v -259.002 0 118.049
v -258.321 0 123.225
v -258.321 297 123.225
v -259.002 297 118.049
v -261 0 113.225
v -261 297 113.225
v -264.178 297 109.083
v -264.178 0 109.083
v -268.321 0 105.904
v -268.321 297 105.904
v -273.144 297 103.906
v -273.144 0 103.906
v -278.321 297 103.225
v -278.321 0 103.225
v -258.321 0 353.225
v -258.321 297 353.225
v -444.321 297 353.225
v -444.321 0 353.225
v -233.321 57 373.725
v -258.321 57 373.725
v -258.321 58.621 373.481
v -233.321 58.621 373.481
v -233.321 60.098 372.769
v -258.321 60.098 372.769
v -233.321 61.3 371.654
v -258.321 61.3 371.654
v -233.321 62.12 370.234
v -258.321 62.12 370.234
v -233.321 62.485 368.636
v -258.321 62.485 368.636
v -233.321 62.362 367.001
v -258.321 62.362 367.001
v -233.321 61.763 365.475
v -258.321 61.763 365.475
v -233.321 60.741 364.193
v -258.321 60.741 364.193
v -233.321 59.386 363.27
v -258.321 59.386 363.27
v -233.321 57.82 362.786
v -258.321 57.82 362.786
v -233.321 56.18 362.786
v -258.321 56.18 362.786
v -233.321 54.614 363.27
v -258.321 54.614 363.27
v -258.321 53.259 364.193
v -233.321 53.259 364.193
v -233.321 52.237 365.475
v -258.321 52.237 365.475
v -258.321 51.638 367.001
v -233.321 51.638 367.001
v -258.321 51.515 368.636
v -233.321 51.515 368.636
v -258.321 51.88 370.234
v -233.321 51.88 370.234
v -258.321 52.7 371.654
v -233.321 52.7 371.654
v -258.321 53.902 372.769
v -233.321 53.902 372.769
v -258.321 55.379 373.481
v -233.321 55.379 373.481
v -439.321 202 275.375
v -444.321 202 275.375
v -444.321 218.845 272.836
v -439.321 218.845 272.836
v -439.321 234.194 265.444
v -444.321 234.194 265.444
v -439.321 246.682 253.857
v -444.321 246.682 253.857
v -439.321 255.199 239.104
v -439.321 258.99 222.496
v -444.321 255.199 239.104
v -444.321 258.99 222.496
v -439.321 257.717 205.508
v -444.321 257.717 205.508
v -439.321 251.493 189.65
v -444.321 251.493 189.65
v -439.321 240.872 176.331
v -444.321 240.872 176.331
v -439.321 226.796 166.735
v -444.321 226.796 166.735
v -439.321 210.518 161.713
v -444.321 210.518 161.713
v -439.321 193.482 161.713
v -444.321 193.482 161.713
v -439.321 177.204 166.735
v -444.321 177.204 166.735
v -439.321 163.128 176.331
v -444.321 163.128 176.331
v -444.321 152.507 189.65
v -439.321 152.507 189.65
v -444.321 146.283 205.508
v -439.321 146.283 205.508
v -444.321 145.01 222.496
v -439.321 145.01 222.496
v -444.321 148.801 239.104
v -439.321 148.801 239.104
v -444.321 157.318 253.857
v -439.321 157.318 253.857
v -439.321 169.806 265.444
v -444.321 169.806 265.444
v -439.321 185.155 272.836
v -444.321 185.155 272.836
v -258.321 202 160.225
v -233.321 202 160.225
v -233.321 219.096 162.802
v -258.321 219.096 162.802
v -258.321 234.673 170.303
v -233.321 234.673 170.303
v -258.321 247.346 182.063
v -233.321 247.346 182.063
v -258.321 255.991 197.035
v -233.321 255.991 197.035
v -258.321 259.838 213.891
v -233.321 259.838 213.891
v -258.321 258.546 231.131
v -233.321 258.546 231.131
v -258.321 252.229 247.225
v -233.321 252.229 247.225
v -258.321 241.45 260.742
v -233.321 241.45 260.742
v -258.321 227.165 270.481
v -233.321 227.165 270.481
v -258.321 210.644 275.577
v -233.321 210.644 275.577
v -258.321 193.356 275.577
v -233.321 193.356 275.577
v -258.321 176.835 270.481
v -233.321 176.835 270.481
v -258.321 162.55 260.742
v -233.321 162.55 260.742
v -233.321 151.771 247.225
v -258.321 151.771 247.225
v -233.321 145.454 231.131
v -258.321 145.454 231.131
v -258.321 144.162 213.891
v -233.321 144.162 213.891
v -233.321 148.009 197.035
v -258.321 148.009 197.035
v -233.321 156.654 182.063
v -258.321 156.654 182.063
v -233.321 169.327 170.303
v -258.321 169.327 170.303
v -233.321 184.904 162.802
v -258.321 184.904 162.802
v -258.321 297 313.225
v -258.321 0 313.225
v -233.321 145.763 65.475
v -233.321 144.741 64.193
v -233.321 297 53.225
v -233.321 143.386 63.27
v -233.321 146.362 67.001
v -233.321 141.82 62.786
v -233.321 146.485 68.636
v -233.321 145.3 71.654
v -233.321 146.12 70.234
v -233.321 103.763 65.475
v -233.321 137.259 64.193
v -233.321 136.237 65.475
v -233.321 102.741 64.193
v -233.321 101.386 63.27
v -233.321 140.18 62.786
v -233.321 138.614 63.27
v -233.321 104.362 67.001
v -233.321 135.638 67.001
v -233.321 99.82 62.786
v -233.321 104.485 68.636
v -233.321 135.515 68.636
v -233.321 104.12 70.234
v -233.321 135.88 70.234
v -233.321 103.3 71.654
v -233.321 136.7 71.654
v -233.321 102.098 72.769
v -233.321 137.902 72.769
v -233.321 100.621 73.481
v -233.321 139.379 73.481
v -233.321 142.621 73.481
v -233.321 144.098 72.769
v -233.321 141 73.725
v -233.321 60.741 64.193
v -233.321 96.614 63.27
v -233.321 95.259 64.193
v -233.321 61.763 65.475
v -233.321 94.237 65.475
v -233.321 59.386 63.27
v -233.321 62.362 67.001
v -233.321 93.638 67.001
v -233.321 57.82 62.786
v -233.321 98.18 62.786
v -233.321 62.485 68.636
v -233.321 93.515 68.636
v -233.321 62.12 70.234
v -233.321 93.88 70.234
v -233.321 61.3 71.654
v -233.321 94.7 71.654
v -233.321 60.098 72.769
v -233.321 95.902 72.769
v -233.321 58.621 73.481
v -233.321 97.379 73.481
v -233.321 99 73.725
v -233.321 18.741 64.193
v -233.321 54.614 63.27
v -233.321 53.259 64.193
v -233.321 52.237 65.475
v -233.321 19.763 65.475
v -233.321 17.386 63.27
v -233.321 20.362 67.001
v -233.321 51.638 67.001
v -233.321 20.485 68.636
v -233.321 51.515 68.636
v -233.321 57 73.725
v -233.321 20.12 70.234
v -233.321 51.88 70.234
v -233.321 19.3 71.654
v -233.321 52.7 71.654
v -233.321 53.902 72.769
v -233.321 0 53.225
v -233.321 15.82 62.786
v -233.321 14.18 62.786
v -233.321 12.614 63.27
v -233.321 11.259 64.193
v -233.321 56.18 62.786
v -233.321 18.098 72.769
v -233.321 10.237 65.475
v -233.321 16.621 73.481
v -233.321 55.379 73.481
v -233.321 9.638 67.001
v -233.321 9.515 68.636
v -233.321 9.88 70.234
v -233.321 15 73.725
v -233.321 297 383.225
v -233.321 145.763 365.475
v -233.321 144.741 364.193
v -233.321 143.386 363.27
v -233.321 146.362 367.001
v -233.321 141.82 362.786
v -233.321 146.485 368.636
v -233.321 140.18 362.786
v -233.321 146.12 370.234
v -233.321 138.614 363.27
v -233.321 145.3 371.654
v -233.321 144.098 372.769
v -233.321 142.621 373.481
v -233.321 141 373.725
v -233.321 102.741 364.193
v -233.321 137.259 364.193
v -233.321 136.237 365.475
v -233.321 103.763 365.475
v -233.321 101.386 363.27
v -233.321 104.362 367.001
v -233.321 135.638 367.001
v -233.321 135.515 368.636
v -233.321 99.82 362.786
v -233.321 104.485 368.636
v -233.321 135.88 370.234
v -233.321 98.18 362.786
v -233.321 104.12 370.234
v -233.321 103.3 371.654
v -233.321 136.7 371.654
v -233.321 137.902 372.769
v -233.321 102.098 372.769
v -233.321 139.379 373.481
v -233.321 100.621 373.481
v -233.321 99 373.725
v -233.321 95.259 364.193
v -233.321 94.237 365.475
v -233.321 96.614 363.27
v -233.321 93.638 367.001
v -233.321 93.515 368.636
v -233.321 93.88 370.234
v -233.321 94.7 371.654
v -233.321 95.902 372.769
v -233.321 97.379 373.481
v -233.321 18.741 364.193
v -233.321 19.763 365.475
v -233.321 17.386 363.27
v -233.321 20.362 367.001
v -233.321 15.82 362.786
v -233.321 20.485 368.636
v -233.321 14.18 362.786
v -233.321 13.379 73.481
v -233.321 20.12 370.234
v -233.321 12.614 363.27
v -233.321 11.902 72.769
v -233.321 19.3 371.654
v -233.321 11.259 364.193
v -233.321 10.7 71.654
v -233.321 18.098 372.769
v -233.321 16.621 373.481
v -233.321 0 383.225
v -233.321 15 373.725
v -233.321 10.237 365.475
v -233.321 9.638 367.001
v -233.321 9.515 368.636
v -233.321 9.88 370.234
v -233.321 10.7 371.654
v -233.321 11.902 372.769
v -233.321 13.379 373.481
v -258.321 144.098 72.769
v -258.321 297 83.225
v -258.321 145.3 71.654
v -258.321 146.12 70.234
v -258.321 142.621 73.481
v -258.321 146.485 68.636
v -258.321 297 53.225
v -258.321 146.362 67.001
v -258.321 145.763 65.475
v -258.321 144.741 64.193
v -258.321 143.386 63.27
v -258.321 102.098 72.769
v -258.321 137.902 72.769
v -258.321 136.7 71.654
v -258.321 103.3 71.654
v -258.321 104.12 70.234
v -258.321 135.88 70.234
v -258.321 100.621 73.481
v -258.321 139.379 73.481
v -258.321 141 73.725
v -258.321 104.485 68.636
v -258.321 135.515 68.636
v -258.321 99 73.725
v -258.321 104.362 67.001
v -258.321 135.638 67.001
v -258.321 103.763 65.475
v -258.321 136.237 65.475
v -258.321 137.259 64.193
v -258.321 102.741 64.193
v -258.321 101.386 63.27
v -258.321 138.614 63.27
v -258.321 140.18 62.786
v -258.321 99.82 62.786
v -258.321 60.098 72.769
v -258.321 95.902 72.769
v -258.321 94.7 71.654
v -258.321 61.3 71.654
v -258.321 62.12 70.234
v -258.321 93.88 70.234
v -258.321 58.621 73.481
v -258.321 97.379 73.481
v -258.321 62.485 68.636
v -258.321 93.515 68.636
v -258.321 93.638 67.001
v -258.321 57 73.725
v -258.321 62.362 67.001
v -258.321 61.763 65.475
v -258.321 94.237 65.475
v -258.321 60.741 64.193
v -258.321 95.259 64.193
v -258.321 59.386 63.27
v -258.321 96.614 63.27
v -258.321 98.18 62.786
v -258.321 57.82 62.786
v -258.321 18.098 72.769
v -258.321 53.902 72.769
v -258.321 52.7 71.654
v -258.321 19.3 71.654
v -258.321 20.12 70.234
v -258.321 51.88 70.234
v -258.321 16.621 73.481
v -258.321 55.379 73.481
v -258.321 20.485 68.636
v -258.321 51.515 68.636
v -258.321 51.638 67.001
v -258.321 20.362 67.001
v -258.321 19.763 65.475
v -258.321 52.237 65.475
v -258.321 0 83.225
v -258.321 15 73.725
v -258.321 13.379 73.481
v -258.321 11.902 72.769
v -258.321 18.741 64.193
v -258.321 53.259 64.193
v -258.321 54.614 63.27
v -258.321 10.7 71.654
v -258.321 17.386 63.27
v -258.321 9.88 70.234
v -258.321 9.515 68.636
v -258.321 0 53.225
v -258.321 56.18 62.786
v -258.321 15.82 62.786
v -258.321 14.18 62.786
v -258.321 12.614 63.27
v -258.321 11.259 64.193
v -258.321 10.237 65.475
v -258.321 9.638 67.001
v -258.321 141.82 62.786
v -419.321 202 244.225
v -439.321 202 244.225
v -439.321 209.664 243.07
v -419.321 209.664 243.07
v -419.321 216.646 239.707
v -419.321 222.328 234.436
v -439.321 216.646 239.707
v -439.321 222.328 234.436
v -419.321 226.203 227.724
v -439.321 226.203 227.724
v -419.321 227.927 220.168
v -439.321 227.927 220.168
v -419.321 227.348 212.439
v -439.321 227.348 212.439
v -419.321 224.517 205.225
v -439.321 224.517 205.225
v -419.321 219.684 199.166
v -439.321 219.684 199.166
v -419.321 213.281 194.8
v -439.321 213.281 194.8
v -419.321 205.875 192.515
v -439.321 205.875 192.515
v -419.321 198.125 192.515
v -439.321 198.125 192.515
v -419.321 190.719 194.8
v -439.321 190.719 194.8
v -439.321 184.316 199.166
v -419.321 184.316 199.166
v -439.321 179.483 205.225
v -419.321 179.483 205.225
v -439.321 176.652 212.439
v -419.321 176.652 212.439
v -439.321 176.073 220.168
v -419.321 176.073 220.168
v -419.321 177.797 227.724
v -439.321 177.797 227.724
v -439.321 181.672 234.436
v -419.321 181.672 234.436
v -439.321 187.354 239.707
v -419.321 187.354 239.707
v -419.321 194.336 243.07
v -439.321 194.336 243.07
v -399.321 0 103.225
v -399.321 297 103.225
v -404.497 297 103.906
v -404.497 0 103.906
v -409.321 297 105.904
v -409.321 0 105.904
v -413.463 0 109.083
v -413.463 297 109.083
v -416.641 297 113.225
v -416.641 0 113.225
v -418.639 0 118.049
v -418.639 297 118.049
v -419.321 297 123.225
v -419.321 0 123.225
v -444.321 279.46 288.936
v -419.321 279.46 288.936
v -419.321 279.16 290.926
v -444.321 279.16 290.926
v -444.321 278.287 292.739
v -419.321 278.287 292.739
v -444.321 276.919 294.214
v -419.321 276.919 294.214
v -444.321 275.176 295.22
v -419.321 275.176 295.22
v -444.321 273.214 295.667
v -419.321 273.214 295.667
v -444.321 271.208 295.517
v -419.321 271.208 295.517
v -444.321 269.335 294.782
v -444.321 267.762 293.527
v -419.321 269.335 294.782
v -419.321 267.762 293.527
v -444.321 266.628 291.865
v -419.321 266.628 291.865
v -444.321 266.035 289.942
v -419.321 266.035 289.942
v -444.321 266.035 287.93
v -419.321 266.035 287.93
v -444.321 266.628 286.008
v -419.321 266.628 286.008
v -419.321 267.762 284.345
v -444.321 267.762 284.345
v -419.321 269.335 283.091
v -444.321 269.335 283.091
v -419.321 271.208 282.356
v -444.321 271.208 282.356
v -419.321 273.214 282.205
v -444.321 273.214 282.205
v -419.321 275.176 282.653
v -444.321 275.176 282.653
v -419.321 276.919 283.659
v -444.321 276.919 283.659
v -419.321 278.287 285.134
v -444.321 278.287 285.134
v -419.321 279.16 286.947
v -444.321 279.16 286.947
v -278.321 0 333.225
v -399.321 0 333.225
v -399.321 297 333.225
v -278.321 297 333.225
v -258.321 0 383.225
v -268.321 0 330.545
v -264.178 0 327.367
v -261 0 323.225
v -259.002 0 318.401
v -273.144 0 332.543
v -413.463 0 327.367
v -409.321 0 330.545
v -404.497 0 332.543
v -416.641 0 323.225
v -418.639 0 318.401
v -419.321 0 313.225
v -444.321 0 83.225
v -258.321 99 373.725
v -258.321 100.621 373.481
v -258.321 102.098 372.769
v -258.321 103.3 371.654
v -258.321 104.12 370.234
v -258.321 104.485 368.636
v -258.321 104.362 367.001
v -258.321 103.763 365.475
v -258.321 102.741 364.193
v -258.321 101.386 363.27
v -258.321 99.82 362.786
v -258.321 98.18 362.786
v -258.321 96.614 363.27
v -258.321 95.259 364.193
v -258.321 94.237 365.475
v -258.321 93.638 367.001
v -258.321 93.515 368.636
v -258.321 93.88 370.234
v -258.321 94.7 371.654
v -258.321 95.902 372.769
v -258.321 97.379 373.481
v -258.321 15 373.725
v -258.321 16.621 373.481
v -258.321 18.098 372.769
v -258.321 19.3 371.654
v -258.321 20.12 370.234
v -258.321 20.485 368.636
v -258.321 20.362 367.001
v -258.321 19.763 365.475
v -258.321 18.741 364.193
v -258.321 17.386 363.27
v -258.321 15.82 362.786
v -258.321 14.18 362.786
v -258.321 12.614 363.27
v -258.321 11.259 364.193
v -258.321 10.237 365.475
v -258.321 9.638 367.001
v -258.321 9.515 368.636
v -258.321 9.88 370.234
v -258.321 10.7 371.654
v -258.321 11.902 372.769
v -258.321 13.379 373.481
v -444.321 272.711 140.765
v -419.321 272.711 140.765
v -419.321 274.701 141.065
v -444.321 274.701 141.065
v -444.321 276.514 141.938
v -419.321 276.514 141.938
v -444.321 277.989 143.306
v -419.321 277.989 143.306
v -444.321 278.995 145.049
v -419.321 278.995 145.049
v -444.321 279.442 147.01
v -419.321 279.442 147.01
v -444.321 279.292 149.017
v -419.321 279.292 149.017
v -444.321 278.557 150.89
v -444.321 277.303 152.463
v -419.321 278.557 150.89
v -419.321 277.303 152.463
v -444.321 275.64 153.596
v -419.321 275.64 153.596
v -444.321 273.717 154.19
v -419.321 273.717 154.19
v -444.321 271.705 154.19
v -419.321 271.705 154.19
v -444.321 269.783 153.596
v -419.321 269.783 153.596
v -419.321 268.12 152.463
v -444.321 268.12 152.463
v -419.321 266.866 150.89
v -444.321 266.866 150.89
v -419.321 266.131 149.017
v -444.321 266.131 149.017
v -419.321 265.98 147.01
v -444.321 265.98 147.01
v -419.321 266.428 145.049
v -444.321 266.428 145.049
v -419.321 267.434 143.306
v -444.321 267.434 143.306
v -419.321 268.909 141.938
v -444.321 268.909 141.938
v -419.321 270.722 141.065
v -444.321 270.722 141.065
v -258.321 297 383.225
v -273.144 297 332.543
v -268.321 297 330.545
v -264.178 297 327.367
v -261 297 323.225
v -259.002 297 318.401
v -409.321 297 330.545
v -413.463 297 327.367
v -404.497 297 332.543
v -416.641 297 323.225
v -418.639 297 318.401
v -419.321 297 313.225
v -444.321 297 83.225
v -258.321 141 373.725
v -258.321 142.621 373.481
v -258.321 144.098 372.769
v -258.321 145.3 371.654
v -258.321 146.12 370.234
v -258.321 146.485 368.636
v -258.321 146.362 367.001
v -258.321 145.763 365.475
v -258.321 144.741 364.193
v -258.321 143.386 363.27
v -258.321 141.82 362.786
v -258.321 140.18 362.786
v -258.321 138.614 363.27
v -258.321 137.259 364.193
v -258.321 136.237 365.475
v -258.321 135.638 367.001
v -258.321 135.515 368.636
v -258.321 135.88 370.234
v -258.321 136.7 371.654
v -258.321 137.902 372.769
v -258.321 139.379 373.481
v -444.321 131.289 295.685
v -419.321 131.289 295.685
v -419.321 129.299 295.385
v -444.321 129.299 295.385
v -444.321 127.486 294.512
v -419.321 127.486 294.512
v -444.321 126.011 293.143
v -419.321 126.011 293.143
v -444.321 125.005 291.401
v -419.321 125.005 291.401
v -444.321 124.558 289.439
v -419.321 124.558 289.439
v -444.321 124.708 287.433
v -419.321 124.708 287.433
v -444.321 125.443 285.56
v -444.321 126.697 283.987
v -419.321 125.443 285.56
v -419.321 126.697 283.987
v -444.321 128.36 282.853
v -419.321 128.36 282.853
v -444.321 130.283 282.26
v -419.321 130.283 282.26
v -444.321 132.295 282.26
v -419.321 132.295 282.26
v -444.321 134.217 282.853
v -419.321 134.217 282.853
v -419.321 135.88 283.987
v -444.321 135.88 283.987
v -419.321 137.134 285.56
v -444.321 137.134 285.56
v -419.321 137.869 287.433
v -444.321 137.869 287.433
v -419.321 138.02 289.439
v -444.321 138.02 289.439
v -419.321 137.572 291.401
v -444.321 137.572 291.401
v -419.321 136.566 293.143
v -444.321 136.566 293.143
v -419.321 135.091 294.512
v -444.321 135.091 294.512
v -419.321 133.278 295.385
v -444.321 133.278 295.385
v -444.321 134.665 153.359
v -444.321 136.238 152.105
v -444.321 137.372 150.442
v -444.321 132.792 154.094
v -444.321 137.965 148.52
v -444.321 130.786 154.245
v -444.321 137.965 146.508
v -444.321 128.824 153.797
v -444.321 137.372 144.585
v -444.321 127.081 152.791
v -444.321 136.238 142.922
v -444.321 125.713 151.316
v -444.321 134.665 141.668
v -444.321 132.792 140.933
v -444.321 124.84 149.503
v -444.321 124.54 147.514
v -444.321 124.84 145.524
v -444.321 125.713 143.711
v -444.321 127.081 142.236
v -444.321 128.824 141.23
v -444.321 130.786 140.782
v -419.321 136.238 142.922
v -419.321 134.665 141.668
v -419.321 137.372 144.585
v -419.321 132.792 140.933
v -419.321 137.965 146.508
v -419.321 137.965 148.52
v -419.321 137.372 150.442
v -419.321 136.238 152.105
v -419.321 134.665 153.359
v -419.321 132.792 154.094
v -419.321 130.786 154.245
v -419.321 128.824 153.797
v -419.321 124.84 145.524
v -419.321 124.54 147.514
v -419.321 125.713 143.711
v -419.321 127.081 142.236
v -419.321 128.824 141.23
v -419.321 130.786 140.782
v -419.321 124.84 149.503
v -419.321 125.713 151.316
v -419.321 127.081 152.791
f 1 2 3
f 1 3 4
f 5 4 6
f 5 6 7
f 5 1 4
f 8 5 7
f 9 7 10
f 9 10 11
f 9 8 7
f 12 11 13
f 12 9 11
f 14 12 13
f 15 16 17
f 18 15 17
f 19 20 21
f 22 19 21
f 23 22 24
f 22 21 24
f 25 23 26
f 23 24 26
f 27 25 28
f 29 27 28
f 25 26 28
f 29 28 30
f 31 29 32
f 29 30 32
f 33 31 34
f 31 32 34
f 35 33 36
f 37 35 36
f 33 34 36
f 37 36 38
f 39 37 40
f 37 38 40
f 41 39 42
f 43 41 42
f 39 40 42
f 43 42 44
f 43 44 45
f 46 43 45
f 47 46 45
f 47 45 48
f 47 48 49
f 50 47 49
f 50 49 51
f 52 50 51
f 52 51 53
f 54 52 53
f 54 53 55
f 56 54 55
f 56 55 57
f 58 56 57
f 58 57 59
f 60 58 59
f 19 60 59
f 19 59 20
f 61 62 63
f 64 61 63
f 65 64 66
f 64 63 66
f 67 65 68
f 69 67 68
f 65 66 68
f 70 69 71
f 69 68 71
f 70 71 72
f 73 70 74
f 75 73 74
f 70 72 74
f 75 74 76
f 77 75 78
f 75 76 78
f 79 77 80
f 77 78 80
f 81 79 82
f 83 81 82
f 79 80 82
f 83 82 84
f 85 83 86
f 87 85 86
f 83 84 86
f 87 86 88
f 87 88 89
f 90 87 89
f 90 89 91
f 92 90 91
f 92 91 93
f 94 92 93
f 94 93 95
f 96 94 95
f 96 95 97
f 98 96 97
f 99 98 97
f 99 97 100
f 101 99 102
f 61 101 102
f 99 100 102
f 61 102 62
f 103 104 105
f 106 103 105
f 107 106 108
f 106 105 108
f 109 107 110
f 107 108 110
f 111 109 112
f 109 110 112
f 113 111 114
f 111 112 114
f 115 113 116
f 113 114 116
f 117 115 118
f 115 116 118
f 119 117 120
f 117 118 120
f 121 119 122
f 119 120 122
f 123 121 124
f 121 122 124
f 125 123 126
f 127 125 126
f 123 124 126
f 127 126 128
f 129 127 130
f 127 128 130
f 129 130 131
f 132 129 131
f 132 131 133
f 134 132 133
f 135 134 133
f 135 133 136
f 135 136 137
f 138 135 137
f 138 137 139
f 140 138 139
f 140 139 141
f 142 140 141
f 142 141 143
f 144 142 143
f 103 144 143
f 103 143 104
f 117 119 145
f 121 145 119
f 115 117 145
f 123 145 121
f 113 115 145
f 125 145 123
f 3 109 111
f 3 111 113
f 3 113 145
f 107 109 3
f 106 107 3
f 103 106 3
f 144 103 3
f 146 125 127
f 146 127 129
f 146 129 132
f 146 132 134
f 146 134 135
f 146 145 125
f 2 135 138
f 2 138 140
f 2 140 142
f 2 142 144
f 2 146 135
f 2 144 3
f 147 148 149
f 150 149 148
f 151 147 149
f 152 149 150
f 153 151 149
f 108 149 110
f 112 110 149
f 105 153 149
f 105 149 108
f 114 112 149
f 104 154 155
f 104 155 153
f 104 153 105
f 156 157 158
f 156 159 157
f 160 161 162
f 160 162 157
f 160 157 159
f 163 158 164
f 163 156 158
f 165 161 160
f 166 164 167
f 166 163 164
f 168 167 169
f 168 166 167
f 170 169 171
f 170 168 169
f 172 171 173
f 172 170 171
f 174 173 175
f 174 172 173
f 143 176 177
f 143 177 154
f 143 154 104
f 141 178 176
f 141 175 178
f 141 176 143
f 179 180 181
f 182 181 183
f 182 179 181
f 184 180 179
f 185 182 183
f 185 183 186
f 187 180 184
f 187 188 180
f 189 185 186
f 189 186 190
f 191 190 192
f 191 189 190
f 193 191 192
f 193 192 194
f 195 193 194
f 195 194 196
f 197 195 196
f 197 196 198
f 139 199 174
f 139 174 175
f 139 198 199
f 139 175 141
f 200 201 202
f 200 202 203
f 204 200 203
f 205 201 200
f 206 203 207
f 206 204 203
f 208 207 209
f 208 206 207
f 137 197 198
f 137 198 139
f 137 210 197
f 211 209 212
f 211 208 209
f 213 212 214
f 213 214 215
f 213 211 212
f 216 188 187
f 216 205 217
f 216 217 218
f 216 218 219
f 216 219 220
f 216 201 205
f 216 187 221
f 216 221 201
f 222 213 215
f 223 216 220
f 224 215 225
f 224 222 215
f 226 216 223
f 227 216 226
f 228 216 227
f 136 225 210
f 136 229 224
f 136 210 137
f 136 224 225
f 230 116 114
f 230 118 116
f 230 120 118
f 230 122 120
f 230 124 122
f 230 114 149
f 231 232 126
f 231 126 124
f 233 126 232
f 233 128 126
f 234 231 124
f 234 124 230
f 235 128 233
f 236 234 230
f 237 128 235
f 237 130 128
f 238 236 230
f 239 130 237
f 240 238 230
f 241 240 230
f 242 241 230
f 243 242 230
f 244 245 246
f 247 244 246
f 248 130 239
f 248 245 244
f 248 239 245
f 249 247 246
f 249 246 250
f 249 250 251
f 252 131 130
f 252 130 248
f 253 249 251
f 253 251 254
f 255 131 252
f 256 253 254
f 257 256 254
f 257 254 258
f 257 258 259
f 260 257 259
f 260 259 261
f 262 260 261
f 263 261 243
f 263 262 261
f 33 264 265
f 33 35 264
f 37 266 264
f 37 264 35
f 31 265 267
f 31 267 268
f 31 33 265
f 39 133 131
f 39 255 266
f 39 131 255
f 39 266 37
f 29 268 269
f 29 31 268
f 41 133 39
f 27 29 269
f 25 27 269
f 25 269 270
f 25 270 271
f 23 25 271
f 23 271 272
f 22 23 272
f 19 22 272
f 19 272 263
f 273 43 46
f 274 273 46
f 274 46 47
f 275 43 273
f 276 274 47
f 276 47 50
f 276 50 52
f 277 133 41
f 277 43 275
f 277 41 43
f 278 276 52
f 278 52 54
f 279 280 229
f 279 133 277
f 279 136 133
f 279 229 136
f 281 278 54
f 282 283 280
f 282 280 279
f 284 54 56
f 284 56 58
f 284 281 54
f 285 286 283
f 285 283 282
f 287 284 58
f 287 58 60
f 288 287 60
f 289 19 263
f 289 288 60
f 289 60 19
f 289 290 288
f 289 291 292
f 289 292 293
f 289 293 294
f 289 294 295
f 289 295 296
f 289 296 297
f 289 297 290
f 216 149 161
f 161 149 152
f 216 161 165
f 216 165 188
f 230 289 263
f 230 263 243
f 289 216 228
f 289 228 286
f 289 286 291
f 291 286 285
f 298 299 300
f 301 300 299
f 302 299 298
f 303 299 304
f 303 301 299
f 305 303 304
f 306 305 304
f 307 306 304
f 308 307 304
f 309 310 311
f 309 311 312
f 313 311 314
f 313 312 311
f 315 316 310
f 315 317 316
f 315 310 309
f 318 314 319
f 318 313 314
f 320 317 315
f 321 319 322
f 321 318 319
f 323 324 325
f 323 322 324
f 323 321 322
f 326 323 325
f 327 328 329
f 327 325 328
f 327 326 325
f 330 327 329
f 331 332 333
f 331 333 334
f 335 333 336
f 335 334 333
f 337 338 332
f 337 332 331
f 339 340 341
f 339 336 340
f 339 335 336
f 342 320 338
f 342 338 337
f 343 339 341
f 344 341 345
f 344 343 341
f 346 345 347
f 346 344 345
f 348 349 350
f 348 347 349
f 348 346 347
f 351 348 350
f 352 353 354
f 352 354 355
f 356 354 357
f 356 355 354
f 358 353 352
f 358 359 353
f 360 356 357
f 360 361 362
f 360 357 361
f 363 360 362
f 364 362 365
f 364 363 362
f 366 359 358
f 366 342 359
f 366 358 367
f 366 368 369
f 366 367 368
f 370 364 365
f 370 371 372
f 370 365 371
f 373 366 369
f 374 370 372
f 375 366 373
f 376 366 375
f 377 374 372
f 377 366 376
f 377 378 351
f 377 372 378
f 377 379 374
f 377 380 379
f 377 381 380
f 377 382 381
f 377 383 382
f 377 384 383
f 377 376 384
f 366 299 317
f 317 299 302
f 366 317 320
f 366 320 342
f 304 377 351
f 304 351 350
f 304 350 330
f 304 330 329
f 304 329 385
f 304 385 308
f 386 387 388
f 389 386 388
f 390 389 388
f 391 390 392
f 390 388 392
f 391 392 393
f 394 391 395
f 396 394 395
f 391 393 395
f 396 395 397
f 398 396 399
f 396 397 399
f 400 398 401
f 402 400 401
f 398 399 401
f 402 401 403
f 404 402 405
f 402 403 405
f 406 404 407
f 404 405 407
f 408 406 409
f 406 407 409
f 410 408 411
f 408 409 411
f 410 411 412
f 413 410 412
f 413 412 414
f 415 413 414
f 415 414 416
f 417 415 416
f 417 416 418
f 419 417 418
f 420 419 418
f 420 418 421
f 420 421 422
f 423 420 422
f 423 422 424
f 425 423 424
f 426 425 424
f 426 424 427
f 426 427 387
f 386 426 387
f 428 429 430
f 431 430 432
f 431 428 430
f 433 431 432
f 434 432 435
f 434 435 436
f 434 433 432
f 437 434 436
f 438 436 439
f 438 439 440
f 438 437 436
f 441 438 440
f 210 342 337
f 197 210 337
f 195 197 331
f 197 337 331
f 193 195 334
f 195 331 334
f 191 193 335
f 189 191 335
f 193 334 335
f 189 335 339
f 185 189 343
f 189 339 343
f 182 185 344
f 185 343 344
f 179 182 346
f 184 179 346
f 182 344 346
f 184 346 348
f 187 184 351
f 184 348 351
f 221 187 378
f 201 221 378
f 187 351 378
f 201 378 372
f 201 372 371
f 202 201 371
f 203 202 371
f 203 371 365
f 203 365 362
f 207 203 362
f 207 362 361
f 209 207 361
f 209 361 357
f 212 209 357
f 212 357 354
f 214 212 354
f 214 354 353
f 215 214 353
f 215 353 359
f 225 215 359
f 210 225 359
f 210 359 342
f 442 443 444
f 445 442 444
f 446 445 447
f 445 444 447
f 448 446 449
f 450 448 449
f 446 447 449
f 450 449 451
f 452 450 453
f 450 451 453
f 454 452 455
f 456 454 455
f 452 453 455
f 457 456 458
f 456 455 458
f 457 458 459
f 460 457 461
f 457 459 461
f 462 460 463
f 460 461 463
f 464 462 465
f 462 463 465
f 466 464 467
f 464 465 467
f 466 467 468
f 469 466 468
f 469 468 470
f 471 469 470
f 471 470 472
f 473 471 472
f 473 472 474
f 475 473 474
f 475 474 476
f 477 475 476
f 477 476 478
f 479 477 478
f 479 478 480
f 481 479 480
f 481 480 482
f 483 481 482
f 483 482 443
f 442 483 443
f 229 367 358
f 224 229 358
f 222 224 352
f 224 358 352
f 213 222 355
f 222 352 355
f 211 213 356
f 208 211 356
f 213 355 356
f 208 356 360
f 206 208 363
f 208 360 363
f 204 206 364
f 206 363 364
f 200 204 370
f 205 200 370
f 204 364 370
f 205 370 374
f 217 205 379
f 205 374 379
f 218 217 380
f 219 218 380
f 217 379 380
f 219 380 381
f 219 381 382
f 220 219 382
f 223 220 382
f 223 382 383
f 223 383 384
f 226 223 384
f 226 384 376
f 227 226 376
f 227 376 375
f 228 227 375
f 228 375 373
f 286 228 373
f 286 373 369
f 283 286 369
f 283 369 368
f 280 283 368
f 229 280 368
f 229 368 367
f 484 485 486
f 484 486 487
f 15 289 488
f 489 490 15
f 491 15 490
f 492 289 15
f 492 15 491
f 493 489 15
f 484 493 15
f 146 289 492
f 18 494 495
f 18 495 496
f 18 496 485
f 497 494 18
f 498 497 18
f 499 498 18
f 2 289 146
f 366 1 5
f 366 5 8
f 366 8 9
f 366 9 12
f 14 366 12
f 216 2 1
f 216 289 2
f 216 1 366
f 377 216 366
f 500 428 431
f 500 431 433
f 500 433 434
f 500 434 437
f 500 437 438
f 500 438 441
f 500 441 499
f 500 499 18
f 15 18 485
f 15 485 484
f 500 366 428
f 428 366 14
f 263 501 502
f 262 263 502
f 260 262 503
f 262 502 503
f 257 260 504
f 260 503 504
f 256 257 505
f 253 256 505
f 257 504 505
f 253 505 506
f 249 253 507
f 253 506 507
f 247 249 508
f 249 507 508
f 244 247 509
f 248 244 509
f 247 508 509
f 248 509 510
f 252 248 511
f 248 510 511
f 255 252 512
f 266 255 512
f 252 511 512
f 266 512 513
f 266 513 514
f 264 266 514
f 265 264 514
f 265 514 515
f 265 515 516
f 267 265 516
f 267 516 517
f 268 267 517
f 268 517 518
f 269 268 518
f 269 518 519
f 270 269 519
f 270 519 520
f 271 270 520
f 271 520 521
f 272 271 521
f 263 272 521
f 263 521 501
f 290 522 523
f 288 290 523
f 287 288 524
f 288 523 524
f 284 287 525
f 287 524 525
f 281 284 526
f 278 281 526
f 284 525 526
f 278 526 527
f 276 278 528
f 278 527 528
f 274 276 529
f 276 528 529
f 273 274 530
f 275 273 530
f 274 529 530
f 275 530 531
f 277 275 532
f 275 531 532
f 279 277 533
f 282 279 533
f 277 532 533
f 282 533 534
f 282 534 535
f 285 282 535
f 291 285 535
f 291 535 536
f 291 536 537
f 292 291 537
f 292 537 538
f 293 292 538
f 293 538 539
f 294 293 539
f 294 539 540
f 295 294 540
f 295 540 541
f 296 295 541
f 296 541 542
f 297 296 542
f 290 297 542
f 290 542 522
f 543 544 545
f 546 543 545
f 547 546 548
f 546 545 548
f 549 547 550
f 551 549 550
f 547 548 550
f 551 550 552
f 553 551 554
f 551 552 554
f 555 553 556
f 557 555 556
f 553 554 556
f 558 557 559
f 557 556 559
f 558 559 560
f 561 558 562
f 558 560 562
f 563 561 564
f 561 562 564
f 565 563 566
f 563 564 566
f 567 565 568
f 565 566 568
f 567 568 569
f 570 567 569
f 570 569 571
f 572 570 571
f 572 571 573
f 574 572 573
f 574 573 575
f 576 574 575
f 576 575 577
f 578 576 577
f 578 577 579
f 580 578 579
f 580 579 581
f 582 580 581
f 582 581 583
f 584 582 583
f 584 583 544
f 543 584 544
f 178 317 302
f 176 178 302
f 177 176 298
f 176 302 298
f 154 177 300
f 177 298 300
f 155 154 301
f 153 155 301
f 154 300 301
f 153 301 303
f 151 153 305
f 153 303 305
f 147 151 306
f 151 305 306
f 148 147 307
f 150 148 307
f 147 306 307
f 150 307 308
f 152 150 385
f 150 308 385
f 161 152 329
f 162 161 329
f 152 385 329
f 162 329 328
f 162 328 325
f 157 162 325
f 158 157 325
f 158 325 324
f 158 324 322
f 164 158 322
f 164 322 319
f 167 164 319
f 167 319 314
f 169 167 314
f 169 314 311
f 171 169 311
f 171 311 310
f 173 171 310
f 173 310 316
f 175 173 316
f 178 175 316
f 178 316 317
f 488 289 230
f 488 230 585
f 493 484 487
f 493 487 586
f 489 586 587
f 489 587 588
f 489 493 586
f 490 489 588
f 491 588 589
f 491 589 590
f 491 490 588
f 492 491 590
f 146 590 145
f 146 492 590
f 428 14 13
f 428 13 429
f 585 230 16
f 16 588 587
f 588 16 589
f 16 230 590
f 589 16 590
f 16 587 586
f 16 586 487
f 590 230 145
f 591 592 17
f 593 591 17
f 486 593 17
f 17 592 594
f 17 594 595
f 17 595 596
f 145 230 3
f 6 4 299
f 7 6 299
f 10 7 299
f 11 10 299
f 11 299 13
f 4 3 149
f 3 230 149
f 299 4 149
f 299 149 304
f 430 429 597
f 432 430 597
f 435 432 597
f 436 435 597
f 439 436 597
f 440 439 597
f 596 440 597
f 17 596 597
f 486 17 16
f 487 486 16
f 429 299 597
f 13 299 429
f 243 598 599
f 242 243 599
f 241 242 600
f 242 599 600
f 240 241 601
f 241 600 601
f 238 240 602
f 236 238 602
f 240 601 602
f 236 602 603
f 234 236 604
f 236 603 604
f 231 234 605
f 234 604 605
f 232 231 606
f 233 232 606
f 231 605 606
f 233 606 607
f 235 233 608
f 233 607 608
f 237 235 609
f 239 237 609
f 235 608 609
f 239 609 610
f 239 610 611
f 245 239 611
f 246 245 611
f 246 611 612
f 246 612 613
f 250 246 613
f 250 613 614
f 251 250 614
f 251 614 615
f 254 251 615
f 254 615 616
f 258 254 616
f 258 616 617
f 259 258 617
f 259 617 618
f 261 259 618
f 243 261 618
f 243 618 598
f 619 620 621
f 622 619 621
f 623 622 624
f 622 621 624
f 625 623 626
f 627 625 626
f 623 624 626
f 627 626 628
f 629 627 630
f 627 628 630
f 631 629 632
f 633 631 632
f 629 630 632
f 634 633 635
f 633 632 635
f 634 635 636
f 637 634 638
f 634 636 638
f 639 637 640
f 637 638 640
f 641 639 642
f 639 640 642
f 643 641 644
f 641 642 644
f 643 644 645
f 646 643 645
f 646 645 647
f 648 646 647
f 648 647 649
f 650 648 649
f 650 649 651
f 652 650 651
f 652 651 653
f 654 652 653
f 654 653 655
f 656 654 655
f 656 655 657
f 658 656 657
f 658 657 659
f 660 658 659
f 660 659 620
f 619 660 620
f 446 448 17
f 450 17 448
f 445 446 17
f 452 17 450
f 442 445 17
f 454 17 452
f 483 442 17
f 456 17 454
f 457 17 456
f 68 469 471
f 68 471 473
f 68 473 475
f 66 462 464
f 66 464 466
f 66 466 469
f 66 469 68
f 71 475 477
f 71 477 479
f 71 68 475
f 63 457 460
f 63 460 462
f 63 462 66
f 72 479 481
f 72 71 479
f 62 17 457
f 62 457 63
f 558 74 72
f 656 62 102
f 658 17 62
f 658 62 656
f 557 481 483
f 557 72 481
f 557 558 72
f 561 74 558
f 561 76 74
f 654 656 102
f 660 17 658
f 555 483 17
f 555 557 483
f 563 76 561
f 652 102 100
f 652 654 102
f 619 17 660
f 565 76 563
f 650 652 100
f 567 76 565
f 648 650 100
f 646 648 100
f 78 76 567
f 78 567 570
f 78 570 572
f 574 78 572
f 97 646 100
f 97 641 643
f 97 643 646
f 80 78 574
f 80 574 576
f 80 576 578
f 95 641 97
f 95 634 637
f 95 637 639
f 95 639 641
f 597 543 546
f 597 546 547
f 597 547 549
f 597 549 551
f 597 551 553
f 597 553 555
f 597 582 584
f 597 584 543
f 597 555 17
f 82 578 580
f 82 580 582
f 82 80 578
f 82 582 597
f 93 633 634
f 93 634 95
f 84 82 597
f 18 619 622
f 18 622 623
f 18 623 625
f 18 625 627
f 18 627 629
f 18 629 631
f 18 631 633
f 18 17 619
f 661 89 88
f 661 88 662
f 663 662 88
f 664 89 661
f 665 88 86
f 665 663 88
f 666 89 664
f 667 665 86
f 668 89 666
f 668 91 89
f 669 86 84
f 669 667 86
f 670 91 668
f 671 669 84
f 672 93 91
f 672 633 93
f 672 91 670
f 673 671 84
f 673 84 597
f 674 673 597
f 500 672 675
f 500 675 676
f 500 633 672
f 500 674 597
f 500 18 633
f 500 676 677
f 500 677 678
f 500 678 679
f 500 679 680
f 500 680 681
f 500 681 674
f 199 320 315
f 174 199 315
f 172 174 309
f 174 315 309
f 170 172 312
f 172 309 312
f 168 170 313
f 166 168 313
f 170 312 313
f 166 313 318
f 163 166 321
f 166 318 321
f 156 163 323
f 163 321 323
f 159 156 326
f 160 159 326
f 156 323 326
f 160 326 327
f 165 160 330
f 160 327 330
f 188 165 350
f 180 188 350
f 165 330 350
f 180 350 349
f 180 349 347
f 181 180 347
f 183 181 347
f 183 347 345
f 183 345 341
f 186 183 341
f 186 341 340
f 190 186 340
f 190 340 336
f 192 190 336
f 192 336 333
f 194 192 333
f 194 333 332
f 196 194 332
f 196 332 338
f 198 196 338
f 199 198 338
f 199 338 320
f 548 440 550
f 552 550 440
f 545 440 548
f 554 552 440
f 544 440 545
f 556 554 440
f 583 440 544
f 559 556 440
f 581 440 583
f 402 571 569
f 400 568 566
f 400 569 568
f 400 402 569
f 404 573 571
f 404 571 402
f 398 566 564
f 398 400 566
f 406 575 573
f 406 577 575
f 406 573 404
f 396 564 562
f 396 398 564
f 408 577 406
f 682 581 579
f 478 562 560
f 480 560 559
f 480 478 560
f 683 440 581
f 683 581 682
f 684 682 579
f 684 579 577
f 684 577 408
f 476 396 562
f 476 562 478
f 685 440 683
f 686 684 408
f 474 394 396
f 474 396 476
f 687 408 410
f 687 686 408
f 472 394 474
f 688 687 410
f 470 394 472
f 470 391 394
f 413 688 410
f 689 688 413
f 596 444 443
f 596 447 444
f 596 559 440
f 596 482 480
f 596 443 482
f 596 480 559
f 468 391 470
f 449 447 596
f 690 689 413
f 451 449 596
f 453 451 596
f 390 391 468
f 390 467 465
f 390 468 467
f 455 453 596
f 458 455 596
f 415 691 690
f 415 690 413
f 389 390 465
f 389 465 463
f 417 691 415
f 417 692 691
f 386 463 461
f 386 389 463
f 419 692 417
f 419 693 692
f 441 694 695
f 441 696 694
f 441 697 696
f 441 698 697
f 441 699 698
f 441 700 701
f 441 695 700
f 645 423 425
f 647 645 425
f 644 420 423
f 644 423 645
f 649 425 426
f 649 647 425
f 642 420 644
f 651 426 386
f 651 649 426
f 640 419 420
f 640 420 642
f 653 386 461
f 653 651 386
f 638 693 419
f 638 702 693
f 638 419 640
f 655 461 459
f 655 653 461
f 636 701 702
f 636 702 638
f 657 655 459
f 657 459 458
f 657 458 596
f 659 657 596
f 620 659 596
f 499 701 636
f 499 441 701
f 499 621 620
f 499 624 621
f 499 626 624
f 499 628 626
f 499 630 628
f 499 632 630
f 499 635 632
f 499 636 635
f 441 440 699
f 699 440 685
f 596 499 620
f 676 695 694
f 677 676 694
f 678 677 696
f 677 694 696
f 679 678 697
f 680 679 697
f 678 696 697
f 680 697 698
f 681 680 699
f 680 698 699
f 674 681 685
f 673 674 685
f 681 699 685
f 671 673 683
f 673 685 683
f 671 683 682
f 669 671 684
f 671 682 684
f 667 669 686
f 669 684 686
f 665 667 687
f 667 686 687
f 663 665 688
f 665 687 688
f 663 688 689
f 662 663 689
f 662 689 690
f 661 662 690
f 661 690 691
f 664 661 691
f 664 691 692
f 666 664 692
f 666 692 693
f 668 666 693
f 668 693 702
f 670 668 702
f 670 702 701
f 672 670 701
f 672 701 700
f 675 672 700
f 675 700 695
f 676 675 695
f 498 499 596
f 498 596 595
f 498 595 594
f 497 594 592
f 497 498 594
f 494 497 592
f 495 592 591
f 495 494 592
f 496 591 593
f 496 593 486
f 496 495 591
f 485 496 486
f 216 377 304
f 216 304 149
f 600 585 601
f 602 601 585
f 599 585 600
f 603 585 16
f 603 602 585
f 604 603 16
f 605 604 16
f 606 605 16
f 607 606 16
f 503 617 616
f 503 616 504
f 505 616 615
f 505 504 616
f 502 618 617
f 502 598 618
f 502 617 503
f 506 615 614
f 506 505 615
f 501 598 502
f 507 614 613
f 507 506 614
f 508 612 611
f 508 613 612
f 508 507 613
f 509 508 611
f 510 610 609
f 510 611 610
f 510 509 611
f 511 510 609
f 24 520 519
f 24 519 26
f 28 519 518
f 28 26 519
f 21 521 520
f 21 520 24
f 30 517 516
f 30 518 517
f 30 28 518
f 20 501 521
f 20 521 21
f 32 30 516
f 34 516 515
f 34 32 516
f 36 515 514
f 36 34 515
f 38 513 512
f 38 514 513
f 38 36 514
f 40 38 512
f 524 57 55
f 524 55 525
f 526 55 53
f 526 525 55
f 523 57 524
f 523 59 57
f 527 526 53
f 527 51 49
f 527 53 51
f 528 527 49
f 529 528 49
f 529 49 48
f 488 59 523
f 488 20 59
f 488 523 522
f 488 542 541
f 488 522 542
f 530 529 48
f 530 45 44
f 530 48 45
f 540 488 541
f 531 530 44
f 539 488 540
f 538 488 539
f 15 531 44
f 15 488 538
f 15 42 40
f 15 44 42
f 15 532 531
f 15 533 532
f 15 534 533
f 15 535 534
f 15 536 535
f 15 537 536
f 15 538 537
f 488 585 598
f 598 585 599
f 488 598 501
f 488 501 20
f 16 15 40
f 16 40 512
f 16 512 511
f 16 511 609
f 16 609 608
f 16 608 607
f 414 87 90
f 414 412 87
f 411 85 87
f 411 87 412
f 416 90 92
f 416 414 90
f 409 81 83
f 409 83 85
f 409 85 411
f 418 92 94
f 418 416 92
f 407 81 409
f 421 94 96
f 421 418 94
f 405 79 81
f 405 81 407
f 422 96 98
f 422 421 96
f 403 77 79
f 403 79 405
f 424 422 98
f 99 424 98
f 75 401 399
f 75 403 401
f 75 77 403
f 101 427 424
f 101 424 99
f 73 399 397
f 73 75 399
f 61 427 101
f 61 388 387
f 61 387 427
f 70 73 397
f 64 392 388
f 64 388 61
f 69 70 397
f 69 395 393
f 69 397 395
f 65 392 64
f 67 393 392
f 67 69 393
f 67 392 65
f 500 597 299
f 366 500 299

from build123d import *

# Parameters (mm, degrees)
EXTRUDE_1_DEPTH          = 297
SKETCH_6_R               = 57.15
CUT_EXTRUDE_1_DEPTH      = 5
CUT_EXTRUDE_2_REACH      = 528.789
SKETCH_7_R               = 26
CUT_EXTRUDE_3_REACH      = 530.764
SKETCH_8_R               = 58
CUT_EXTRUDE_4_REACH      = 521.294
SKETCH_10_R              = 5.5
HOLE_WIZARD_M12_1_D      = 13.5
HOLE_WIZARD_M12_1_DEPTH  = 25
PATTERN_CIRCULAR_1_COUNT = 4


with BuildPart() as part:
    # 草图4 → 凸台-拉伸1 (new body)
    with BuildSketch(Plane(origin=(0, 0, 0), x_dir=(1, 0, 0), z_dir=(0, 1, 0))):
        Polygon((-258.320541352, -83.224920734), (-258.320541352, -53.224920734), (-233.320541352, -53.224920734), (-233.320541352, -383.224920734), (-258.320541352, -383.224920734), (-258.320541352, -353.224920734), (-444.320541352, -353.224920734), (-444.320541352, -83.224920734), align=None)
        with BuildLine():
            Line((-258.320541352, -313.224920734), (-258.320541352, -123.224920734))
            ThreePointArc((-258.320541352, -123.224920734), (-264.178405729, -109.08278511), (-278.320541352, -103.224920734))
            Line((-278.320541352, -103.224920734), (-399.320541352, -103.224920734))
            ThreePointArc((-399.320541352, -103.224920734), (-413.462676976, -109.08278511), (-419.320541352, -123.224920734))
            Line((-419.320541352, -123.224920734), (-419.320541352, -313.224920734))
            ThreePointArc((-419.320541352, -313.224920734), (-413.462676976, -327.367056358), (-399.320541352, -333.224920734))
            Line((-399.320541352, -333.224920734), (-278.320541352, -333.224920734))
            ThreePointArc((-278.320541352, -333.224920734), (-264.178405729, -327.367056358), (-258.320541352, -313.224920734))
        make_face(mode=Mode.SUBTRACT)
    extrude(amount=EXTRUDE_1_DEPTH)

    # 草图6 → 切除-拉伸1 (cut)
    with BuildSketch(Plane.ZY.offset(444.320541352)):
        with Locations((218.224920734, 202)):
            Circle(SKETCH_6_R)
    extrude(amount=-CUT_EXTRUDE_1_DEPTH, mode=Mode.SUBTRACT)

    # 草图7 → 切除-拉伸2 (cut, up to next)
    with BuildSketch(Plane.ZY.offset(439.320541352), mode=Mode.PRIVATE) as cut_extrude_2_sk1:
        with Locations((218.224920734, 202)):
            Circle(SKETCH_7_R)
    cut_extrude_2_tool1 = extrude(cut_extrude_2_sk1.sketch, amount=-CUT_EXTRUDE_2_REACH, mode=Mode.PRIVATE) & part.part
    add(cut_extrude_2_tool1.solids().sort_by_distance((-439.320541, 202, 218.224921))[0], mode=Mode.SUBTRACT)

    # 草图8 → 切除-拉伸3 (cut, up to next)
    with BuildSketch(Plane(origin=(-233.320541352, 0, 0), x_dir=(0, 0, -1), z_dir=(1, 0, 0)), mode=Mode.PRIVATE) as cut_extrude_3_sk1:
        with Locations((-218.224920734, 202)):
            Circle(SKETCH_8_R)
    cut_extrude_3_tool1 = extrude(cut_extrude_3_sk1.sketch, amount=-CUT_EXTRUDE_3_REACH, mode=Mode.PRIVATE) & part.part
    add(cut_extrude_3_tool1.solids().sort_by_distance((-233.320541, 202, 218.224921))[0], mode=Mode.SUBTRACT)

    # 草图10 → 切除-拉伸4 (cut, up to next)
    with BuildSketch(Plane.ZY.offset(258.320541352), mode=Mode.PRIVATE) as cut_extrude_4_sk1:
        with Locations((368.224920734, 15)):
            Circle(SKETCH_10_R)
    cut_extrude_4_tool1 = extrude(cut_extrude_4_sk1.sketch, amount=-CUT_EXTRUDE_4_REACH, mode=Mode.PRIVATE) & part.part
    # 草图10 → 切除-拉伸4 (cut, up to next)
    with BuildSketch(Plane.ZY.offset(258.320541352), mode=Mode.PRIVATE) as cut_extrude_4_sk2:
        with Locations((368.224920734, 57)):
            Circle(SKETCH_10_R)
    cut_extrude_4_tool2 = extrude(cut_extrude_4_sk2.sketch, amount=-CUT_EXTRUDE_4_REACH, mode=Mode.PRIVATE) & part.part
    # 草图10 → 切除-拉伸4 (cut, up to next)
    with BuildSketch(Plane.ZY.offset(258.320541352), mode=Mode.PRIVATE) as cut_extrude_4_sk3:
        with Locations((368.224920734, 99)):
            Circle(SKETCH_10_R)
    cut_extrude_4_tool3 = extrude(cut_extrude_4_sk3.sketch, amount=-CUT_EXTRUDE_4_REACH, mode=Mode.PRIVATE) & part.part
    # 草图10 → 切除-拉伸4 (cut, up to next)
    with BuildSketch(Plane.ZY.offset(258.320541352), mode=Mode.PRIVATE) as cut_extrude_4_sk4:
        with Locations((368.224920734, 141)):
            Circle(SKETCH_10_R)
    cut_extrude_4_tool4 = extrude(cut_extrude_4_sk4.sketch, amount=-CUT_EXTRUDE_4_REACH, mode=Mode.PRIVATE) & part.part
    # 草图10 → 切除-拉伸4 (cut, up to next)
    with BuildSketch(Plane.ZY.offset(258.320541352), mode=Mode.PRIVATE) as cut_extrude_4_sk5:
        with Locations((68.224920734, 141)):
            Circle(SKETCH_10_R)
    cut_extrude_4_tool5 = extrude(cut_extrude_4_sk5.sketch, amount=-CUT_EXTRUDE_4_REACH, mode=Mode.PRIVATE) & part.part
    # 草图10 → 切除-拉伸4 (cut, up to next)
    with BuildSketch(Plane.ZY.offset(258.320541352), mode=Mode.PRIVATE) as cut_extrude_4_sk6:
        with Locations((68.224920734, 15)):
            Circle(SKETCH_10_R)
    cut_extrude_4_tool6 = extrude(cut_extrude_4_sk6.sketch, amount=-CUT_EXTRUDE_4_REACH, mode=Mode.PRIVATE) & part.part
    # 草图10 → 切除-拉伸4 (cut, up to next)
    with BuildSketch(Plane.ZY.offset(258.320541352), mode=Mode.PRIVATE) as cut_extrude_4_sk7:
        with Locations((68.224920734, 57)):
            Circle(SKETCH_10_R)
    cut_extrude_4_tool7 = extrude(cut_extrude_4_sk7.sketch, amount=-CUT_EXTRUDE_4_REACH, mode=Mode.PRIVATE) & part.part
    # 草图10 → 切除-拉伸4 (cut, up to next)
    with BuildSketch(Plane.ZY.offset(258.320541352), mode=Mode.PRIVATE) as cut_extrude_4_sk8:
        with Locations((68.224920734, 99)):
            Circle(SKETCH_10_R)
    cut_extrude_4_tool8 = extrude(cut_extrude_4_sk8.sketch, amount=-CUT_EXTRUDE_4_REACH, mode=Mode.PRIVATE) & part.part
    add(cut_extrude_4_tool1.solids().sort_by_distance((-258.320541, 15, 368.224921))[0], mode=Mode.SUBTRACT)
    add(cut_extrude_4_tool2.solids().sort_by_distance((-258.320541, 57, 368.224921))[0], mode=Mode.SUBTRACT)
    add(cut_extrude_4_tool3.solids().sort_by_distance((-258.320541, 99, 368.224921))[0], mode=Mode.SUBTRACT)
    add(cut_extrude_4_tool4.solids().sort_by_distance((-258.320541, 141, 368.224921))[0], mode=Mode.SUBTRACT)
    add(cut_extrude_4_tool5.solids().sort_by_distance((-258.320541, 141, 68.224921))[0], mode=Mode.SUBTRACT)
    add(cut_extrude_4_tool6.solids().sort_by_distance((-258.320541, 15, 68.224921))[0], mode=Mode.SUBTRACT)
    add(cut_extrude_4_tool7.solids().sort_by_distance((-258.320541, 57, 68.224921))[0], mode=Mode.SUBTRACT)
    add(cut_extrude_4_tool8.solids().sort_by_distance((-258.320541, 99, 68.224921))[0], mode=Mode.SUBTRACT)

    # M12 间隙孔1
    with Locations(Plane.ZY.offset(444.320541352)):
        with Locations((147.514920734, 272.711356231)):
            hole_wizard_m12_1 = Hole(HOLE_WIZARD_M12_1_D / 2, depth=HOLE_WIZARD_M12_1_DEPTH)

    # 阵列(圆周)1: M12 间隙孔1 ×4 about axis
    pattern_circular_1_axis = Axis((0, 202, 218.224920734), (1, 0, 0))
    for i in range(1, PATTERN_CIRCULAR_1_COUNT):
        add(hole_wizard_m12_1.rotate(pattern_circular_1_axis, i * 360 / PATTERN_CIRCULAR_1_COUNT), mode=Mode.SUBTRACT)


solid = part.part
